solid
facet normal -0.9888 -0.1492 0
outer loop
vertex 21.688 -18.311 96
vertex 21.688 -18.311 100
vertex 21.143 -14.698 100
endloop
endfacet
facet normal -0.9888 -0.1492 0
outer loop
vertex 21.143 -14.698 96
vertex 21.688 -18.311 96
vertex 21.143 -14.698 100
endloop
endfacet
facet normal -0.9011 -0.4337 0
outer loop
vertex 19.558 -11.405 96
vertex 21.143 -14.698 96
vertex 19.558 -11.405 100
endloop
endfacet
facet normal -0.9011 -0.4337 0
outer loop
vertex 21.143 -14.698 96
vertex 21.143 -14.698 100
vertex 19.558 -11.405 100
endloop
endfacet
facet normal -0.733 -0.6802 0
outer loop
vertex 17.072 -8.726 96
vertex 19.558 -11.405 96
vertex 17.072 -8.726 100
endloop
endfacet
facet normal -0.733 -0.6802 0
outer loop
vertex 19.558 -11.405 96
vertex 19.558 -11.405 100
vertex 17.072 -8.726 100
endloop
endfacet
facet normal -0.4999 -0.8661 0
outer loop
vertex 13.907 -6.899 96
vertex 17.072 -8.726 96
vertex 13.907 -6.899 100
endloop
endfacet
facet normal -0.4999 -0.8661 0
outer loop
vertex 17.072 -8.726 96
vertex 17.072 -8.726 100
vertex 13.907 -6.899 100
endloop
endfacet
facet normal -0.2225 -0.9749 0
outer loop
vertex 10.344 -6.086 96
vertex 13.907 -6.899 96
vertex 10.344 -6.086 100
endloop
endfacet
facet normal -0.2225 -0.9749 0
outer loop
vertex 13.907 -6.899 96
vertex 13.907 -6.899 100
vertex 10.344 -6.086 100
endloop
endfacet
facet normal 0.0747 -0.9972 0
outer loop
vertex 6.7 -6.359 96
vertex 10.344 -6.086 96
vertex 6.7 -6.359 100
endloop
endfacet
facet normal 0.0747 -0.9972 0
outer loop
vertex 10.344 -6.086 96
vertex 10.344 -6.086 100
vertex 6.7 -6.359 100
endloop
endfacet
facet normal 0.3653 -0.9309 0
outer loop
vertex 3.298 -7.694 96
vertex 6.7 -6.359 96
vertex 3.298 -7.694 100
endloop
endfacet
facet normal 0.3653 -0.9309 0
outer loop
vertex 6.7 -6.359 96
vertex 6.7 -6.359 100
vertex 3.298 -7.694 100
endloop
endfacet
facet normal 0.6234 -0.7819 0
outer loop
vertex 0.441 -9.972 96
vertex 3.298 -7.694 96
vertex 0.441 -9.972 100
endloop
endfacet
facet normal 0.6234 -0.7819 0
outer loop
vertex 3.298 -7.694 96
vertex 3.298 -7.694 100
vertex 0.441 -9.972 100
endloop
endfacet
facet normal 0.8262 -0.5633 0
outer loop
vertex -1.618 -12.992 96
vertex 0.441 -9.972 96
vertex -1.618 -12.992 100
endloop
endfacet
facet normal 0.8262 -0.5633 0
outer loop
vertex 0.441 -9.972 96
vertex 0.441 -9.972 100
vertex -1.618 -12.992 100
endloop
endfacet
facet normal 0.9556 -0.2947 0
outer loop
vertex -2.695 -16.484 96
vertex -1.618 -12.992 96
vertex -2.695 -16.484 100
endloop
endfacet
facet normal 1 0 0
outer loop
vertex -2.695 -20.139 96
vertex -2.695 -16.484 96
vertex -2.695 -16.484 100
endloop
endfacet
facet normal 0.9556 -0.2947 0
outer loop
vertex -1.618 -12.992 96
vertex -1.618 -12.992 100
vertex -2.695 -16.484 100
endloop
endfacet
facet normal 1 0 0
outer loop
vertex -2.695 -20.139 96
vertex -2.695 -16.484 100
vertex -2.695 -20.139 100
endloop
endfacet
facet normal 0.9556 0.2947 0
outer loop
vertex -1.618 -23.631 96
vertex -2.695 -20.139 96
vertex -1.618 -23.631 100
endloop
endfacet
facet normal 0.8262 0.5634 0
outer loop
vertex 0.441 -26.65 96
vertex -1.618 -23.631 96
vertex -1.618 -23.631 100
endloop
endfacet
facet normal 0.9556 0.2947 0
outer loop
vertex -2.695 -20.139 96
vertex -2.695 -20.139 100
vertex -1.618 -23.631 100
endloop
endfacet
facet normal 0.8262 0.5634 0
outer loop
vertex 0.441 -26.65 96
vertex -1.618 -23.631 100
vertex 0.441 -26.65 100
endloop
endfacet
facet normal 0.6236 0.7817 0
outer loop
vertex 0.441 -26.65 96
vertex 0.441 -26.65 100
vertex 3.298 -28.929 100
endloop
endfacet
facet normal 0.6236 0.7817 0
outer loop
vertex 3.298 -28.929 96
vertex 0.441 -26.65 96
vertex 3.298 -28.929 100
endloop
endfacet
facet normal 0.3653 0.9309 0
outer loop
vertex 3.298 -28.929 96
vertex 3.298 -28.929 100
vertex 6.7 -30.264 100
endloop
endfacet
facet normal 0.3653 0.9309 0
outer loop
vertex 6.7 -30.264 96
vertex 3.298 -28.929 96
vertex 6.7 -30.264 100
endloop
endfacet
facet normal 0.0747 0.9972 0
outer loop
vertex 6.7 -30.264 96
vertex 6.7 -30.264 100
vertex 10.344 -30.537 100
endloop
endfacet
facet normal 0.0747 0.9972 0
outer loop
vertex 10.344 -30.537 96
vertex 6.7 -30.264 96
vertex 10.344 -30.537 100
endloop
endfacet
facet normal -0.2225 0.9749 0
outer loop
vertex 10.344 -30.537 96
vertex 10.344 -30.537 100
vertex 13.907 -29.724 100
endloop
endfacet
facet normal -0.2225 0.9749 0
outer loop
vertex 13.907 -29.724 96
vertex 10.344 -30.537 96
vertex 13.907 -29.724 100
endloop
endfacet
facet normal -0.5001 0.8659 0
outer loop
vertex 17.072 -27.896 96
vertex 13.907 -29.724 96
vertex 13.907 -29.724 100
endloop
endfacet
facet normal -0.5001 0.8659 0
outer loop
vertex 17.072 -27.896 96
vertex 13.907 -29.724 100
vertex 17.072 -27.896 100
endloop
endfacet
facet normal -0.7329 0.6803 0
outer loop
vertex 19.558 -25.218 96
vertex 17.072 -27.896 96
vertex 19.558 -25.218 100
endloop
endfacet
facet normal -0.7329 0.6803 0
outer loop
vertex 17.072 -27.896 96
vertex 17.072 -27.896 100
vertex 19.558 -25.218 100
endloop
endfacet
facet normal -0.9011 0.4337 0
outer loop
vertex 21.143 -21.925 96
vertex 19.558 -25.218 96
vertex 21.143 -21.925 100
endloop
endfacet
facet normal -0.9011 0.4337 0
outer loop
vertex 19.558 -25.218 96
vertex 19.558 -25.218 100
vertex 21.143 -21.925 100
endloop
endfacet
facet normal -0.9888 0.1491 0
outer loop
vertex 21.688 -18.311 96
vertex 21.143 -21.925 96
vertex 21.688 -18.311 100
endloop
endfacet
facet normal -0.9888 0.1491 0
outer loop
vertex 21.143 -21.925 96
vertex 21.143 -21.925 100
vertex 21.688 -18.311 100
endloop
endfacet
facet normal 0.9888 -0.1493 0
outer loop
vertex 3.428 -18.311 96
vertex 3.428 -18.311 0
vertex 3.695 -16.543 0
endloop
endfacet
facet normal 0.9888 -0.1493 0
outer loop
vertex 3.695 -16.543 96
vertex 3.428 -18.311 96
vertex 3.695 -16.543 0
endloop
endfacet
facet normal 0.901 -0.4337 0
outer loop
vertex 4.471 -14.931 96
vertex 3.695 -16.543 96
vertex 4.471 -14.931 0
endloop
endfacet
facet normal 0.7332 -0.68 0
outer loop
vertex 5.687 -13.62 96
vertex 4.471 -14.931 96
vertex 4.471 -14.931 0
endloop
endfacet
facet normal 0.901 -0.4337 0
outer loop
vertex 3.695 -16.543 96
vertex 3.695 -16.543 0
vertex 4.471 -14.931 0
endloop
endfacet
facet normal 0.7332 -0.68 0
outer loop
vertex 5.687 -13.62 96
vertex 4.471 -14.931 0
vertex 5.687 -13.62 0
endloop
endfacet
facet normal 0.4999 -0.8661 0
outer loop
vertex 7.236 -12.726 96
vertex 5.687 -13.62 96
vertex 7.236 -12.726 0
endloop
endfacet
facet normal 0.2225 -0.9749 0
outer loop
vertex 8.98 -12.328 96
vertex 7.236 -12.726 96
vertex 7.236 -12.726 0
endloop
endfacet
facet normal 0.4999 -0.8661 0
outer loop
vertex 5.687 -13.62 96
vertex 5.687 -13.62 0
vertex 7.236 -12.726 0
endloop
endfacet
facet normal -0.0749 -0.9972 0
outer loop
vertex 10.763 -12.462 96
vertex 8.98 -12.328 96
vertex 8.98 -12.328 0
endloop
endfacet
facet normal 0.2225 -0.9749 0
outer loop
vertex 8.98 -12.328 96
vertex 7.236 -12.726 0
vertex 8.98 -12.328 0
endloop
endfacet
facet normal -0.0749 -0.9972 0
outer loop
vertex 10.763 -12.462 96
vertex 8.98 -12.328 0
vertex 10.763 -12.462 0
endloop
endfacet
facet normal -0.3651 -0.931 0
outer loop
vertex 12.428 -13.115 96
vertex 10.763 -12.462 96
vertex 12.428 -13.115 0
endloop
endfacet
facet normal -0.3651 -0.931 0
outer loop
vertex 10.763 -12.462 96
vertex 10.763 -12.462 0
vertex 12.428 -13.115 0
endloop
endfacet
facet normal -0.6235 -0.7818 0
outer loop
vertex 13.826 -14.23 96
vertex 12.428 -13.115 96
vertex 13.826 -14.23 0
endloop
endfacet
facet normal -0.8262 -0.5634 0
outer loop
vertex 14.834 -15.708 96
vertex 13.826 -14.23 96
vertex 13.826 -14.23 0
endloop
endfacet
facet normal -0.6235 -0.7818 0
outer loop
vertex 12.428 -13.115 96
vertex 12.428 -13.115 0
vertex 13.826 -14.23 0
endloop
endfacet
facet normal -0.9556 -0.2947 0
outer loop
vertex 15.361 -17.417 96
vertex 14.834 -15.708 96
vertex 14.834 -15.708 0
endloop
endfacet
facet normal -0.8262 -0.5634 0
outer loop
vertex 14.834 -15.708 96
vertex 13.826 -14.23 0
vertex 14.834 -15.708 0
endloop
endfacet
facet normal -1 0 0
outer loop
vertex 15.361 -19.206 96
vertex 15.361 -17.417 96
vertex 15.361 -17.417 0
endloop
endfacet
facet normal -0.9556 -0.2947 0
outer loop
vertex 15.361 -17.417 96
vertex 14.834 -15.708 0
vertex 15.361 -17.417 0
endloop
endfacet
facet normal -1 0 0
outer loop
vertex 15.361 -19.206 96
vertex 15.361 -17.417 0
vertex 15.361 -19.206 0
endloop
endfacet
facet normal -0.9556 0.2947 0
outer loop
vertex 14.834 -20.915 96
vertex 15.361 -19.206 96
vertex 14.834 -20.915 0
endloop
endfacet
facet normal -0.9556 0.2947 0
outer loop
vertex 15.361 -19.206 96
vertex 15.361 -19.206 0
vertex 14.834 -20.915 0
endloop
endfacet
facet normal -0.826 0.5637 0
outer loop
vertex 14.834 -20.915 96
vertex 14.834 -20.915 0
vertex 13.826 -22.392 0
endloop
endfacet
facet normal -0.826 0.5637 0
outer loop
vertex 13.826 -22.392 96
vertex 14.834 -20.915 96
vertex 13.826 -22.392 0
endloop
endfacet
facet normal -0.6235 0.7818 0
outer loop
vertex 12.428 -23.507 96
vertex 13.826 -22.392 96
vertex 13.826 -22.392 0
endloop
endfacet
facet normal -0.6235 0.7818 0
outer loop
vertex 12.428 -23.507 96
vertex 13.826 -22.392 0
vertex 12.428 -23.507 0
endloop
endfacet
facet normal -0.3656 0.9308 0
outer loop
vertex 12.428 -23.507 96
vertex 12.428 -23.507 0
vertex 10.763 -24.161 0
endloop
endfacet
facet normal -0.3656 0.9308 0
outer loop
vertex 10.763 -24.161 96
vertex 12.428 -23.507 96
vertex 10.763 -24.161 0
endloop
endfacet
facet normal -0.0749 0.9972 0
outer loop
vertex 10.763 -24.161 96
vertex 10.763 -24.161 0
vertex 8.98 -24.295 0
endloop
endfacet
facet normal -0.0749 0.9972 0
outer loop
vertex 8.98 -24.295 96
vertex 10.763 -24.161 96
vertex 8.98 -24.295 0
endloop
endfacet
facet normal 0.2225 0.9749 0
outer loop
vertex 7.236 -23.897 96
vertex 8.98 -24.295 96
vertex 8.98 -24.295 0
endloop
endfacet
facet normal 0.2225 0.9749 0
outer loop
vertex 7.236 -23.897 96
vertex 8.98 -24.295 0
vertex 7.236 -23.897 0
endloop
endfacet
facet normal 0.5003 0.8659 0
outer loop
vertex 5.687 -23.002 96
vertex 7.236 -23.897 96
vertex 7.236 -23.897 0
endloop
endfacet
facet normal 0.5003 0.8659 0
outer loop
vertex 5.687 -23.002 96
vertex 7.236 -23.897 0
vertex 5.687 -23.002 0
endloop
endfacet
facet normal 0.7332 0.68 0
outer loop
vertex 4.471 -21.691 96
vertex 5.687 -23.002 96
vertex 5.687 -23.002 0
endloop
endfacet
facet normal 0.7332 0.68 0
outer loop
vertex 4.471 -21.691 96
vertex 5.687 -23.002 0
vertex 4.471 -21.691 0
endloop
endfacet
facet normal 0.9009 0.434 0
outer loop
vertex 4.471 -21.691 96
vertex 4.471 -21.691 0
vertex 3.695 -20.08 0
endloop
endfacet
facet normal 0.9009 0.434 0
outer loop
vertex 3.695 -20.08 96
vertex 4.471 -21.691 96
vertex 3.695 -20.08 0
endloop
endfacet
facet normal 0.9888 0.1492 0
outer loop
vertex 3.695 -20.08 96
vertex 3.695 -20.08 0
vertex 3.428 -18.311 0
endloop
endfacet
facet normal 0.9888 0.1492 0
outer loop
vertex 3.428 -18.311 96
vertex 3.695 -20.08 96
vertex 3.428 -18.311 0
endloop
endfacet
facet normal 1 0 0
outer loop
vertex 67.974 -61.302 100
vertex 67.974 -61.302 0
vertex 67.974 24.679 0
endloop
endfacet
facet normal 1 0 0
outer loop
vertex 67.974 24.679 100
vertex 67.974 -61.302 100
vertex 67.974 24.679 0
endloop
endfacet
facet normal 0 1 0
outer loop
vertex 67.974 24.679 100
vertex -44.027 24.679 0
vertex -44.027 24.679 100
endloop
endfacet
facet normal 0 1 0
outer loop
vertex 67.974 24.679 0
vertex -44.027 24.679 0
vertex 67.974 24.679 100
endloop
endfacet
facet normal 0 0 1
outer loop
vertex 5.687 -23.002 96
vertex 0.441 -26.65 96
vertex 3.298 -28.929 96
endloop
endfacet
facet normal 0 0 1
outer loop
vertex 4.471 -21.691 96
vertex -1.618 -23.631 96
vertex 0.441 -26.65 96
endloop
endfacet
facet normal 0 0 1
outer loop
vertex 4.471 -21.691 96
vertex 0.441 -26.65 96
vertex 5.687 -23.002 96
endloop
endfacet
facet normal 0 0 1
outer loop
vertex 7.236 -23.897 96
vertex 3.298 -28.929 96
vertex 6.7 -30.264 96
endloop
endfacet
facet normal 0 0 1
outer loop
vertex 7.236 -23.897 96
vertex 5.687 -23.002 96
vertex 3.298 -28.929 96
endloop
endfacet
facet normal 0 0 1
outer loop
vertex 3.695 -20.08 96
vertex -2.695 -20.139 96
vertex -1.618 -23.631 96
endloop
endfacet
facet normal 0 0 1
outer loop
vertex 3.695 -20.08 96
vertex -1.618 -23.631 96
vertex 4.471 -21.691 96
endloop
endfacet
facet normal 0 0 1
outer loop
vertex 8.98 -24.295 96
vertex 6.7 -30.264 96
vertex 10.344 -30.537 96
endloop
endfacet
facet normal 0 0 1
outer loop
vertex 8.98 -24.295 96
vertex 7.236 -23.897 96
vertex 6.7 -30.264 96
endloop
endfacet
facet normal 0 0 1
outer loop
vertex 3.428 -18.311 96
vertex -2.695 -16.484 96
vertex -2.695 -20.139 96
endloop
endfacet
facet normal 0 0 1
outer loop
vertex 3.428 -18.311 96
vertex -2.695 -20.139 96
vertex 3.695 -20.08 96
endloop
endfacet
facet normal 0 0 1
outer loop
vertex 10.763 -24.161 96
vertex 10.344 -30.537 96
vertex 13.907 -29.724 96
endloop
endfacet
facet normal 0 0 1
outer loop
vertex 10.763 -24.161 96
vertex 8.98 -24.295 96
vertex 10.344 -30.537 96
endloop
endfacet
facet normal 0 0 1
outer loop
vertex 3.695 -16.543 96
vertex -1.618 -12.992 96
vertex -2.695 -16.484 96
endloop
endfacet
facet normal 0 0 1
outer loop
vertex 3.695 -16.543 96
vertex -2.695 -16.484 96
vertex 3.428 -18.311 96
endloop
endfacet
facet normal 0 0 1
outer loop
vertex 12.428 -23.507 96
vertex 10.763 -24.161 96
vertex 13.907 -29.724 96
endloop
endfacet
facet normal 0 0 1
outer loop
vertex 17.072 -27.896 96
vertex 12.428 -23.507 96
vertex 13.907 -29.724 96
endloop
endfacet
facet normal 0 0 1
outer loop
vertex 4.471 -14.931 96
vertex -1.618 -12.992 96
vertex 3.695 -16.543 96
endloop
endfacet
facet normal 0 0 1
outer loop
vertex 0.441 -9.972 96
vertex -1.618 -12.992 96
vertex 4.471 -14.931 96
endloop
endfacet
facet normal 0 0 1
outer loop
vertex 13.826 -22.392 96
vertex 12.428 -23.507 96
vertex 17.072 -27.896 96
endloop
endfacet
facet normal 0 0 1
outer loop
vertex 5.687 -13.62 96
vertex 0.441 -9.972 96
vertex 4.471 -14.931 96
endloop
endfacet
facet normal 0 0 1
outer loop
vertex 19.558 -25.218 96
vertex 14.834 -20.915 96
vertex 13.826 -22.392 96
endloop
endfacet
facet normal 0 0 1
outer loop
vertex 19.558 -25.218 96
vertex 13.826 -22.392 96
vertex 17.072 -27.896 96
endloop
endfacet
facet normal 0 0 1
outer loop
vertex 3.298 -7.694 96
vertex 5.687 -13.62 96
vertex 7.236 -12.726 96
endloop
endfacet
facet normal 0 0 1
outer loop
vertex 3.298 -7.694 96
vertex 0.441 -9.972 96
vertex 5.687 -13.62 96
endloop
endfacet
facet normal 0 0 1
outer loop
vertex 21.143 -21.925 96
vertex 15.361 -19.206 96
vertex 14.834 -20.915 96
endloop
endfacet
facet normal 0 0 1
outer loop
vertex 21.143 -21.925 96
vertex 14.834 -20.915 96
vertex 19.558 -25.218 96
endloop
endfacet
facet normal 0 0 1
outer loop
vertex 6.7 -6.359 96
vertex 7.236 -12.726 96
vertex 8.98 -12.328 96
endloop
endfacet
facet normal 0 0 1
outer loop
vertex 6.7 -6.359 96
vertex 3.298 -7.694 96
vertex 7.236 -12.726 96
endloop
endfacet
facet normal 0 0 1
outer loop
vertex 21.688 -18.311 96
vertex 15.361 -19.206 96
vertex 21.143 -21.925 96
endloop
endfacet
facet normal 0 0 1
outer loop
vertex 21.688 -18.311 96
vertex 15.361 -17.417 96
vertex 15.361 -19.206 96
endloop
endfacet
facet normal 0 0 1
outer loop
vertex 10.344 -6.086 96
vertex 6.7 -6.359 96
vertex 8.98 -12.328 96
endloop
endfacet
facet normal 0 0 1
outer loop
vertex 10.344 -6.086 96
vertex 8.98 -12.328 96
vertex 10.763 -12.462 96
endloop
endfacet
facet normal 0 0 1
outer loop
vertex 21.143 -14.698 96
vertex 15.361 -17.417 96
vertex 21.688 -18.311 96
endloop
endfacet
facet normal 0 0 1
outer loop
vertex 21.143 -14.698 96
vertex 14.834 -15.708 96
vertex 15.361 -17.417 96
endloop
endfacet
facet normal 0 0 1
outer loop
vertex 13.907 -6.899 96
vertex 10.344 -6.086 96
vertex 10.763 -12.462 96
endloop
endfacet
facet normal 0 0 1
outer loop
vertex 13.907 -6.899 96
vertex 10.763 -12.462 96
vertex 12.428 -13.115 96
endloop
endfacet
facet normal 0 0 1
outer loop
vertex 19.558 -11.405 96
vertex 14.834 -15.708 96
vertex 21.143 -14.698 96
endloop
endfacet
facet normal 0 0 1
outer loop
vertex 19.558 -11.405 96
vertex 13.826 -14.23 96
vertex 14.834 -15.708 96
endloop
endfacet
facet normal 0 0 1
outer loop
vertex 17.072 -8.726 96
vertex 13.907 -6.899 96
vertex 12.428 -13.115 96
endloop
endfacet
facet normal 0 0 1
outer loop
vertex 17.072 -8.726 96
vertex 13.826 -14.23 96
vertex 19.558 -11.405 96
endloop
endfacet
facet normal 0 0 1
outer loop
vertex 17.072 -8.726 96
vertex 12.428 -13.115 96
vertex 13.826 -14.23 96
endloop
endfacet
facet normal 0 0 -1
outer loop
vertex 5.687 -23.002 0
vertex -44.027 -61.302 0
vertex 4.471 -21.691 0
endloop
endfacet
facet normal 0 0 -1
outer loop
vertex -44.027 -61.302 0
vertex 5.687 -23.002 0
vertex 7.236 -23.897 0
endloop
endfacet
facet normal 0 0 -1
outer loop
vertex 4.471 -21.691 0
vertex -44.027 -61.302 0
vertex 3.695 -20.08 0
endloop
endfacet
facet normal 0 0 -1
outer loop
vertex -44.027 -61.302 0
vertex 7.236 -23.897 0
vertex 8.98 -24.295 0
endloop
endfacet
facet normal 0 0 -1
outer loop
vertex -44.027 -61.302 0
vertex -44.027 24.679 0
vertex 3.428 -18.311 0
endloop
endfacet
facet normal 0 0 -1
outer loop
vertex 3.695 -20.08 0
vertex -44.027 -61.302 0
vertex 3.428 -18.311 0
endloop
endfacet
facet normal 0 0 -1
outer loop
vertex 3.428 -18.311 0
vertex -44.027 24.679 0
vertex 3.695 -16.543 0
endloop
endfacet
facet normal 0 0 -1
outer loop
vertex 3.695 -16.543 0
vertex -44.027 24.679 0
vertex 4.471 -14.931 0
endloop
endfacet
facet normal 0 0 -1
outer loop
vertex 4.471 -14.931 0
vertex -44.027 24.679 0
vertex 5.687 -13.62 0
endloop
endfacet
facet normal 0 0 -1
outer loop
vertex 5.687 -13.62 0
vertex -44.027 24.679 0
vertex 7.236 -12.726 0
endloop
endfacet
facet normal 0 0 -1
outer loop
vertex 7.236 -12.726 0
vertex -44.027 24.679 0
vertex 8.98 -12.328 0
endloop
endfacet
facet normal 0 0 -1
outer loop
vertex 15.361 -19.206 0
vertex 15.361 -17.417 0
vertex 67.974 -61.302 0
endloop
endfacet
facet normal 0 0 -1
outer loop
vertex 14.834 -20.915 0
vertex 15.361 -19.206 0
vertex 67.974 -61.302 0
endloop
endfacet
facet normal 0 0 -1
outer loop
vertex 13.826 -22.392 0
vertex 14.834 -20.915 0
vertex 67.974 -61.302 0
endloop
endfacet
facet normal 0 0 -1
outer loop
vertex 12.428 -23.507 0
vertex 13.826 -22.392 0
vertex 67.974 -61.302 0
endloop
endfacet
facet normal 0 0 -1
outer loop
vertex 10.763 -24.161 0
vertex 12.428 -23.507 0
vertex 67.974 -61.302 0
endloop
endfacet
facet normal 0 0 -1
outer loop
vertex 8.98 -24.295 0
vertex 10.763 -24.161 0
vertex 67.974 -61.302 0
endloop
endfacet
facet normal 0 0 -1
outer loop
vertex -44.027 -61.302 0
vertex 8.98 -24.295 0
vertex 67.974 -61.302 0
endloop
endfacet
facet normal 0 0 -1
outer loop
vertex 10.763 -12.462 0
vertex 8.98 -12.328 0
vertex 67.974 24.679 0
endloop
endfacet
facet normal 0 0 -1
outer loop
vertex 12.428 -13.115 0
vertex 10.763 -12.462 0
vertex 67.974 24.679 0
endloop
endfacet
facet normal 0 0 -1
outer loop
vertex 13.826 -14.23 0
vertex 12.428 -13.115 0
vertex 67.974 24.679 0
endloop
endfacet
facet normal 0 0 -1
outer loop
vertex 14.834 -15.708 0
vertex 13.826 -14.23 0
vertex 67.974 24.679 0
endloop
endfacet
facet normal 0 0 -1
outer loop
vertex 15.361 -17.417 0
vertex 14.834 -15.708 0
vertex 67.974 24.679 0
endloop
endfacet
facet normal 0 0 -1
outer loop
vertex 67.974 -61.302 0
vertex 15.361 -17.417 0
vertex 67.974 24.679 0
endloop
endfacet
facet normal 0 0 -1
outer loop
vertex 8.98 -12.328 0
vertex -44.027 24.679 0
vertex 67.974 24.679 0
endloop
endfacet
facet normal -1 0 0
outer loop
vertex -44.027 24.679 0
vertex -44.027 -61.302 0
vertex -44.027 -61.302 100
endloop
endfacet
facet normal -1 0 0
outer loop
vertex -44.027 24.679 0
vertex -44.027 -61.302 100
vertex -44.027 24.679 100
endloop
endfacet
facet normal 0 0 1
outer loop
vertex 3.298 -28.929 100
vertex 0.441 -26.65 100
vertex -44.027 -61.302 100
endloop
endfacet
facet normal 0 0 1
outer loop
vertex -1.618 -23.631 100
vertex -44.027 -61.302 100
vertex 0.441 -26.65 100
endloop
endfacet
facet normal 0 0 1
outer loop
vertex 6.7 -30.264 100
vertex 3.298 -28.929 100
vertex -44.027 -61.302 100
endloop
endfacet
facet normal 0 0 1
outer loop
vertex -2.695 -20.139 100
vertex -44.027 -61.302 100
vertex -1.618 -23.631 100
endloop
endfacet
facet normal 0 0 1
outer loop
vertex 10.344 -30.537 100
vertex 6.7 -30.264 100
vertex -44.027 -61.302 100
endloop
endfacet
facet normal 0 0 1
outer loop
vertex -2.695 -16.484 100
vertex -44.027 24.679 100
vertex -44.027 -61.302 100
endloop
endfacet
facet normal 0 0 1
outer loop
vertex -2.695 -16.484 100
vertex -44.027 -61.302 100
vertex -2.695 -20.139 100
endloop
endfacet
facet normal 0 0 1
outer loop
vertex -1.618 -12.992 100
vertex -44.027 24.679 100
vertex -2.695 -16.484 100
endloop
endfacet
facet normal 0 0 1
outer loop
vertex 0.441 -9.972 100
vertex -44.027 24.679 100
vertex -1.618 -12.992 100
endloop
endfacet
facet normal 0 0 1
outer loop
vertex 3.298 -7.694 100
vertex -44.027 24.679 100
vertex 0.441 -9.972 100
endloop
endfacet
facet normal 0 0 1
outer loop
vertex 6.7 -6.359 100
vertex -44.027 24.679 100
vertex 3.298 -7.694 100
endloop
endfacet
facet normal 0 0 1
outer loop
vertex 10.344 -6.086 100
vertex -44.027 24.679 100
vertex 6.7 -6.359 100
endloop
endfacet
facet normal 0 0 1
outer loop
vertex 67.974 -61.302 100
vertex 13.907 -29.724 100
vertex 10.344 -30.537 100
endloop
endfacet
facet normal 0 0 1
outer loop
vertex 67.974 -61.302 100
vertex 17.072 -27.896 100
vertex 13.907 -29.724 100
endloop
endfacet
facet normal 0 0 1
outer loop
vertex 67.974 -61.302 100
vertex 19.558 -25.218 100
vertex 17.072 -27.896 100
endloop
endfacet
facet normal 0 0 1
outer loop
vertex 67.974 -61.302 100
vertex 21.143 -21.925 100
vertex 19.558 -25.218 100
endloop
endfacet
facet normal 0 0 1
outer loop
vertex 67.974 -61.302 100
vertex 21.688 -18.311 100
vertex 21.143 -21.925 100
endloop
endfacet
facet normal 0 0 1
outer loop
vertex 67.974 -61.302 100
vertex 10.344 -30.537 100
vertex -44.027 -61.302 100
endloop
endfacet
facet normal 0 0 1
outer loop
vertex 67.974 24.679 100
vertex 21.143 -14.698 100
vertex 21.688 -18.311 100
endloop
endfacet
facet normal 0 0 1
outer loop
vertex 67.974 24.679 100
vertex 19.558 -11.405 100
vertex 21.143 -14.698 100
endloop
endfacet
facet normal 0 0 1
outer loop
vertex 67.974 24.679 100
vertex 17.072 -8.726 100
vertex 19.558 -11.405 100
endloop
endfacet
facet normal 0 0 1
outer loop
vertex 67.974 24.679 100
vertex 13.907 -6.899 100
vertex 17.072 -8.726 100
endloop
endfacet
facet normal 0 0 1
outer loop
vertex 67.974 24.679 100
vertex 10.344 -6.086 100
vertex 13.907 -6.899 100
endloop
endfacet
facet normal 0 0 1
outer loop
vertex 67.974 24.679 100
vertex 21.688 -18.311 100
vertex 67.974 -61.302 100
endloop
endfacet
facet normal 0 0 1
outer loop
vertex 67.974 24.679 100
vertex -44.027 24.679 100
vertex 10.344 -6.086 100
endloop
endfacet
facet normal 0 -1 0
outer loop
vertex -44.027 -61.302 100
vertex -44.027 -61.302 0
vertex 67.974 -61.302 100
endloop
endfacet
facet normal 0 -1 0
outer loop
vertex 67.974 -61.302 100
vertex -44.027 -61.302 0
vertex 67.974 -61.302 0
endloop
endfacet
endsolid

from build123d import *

# Parameters (mm, degrees)
F0_W     = 112.000551
F0_H     = 85.980557
F1_DEPTH = 100
F3_D     = 12
F4_R     = 12.259928
F5_DEPTH = 4


with BuildPart() as f1:
    # F0 (on Top) → F1 (new body)
    with BuildSketch(Plane.XY):
        with Locations((11.973376, -18.311291)):
            Rectangle(F0_W, F0_H)
    extrude(amount=F1_DEPTH)

    # F3 (through all)
    with Locations(Plane.XY.offset(100)):
        with Locations((9.428112, -18.311292)):
            Hole(F3_D / 2)

    # F4 (on face) → F5 (cut)
    with BuildSketch(Plane.XY.offset(100)):
        with Locations((9.428112, -18.311292)):
            Circle(F4_R)
    extrude(amount=-F5_DEPTH, mode=Mode.SUBTRACT)


solid = f1.part
